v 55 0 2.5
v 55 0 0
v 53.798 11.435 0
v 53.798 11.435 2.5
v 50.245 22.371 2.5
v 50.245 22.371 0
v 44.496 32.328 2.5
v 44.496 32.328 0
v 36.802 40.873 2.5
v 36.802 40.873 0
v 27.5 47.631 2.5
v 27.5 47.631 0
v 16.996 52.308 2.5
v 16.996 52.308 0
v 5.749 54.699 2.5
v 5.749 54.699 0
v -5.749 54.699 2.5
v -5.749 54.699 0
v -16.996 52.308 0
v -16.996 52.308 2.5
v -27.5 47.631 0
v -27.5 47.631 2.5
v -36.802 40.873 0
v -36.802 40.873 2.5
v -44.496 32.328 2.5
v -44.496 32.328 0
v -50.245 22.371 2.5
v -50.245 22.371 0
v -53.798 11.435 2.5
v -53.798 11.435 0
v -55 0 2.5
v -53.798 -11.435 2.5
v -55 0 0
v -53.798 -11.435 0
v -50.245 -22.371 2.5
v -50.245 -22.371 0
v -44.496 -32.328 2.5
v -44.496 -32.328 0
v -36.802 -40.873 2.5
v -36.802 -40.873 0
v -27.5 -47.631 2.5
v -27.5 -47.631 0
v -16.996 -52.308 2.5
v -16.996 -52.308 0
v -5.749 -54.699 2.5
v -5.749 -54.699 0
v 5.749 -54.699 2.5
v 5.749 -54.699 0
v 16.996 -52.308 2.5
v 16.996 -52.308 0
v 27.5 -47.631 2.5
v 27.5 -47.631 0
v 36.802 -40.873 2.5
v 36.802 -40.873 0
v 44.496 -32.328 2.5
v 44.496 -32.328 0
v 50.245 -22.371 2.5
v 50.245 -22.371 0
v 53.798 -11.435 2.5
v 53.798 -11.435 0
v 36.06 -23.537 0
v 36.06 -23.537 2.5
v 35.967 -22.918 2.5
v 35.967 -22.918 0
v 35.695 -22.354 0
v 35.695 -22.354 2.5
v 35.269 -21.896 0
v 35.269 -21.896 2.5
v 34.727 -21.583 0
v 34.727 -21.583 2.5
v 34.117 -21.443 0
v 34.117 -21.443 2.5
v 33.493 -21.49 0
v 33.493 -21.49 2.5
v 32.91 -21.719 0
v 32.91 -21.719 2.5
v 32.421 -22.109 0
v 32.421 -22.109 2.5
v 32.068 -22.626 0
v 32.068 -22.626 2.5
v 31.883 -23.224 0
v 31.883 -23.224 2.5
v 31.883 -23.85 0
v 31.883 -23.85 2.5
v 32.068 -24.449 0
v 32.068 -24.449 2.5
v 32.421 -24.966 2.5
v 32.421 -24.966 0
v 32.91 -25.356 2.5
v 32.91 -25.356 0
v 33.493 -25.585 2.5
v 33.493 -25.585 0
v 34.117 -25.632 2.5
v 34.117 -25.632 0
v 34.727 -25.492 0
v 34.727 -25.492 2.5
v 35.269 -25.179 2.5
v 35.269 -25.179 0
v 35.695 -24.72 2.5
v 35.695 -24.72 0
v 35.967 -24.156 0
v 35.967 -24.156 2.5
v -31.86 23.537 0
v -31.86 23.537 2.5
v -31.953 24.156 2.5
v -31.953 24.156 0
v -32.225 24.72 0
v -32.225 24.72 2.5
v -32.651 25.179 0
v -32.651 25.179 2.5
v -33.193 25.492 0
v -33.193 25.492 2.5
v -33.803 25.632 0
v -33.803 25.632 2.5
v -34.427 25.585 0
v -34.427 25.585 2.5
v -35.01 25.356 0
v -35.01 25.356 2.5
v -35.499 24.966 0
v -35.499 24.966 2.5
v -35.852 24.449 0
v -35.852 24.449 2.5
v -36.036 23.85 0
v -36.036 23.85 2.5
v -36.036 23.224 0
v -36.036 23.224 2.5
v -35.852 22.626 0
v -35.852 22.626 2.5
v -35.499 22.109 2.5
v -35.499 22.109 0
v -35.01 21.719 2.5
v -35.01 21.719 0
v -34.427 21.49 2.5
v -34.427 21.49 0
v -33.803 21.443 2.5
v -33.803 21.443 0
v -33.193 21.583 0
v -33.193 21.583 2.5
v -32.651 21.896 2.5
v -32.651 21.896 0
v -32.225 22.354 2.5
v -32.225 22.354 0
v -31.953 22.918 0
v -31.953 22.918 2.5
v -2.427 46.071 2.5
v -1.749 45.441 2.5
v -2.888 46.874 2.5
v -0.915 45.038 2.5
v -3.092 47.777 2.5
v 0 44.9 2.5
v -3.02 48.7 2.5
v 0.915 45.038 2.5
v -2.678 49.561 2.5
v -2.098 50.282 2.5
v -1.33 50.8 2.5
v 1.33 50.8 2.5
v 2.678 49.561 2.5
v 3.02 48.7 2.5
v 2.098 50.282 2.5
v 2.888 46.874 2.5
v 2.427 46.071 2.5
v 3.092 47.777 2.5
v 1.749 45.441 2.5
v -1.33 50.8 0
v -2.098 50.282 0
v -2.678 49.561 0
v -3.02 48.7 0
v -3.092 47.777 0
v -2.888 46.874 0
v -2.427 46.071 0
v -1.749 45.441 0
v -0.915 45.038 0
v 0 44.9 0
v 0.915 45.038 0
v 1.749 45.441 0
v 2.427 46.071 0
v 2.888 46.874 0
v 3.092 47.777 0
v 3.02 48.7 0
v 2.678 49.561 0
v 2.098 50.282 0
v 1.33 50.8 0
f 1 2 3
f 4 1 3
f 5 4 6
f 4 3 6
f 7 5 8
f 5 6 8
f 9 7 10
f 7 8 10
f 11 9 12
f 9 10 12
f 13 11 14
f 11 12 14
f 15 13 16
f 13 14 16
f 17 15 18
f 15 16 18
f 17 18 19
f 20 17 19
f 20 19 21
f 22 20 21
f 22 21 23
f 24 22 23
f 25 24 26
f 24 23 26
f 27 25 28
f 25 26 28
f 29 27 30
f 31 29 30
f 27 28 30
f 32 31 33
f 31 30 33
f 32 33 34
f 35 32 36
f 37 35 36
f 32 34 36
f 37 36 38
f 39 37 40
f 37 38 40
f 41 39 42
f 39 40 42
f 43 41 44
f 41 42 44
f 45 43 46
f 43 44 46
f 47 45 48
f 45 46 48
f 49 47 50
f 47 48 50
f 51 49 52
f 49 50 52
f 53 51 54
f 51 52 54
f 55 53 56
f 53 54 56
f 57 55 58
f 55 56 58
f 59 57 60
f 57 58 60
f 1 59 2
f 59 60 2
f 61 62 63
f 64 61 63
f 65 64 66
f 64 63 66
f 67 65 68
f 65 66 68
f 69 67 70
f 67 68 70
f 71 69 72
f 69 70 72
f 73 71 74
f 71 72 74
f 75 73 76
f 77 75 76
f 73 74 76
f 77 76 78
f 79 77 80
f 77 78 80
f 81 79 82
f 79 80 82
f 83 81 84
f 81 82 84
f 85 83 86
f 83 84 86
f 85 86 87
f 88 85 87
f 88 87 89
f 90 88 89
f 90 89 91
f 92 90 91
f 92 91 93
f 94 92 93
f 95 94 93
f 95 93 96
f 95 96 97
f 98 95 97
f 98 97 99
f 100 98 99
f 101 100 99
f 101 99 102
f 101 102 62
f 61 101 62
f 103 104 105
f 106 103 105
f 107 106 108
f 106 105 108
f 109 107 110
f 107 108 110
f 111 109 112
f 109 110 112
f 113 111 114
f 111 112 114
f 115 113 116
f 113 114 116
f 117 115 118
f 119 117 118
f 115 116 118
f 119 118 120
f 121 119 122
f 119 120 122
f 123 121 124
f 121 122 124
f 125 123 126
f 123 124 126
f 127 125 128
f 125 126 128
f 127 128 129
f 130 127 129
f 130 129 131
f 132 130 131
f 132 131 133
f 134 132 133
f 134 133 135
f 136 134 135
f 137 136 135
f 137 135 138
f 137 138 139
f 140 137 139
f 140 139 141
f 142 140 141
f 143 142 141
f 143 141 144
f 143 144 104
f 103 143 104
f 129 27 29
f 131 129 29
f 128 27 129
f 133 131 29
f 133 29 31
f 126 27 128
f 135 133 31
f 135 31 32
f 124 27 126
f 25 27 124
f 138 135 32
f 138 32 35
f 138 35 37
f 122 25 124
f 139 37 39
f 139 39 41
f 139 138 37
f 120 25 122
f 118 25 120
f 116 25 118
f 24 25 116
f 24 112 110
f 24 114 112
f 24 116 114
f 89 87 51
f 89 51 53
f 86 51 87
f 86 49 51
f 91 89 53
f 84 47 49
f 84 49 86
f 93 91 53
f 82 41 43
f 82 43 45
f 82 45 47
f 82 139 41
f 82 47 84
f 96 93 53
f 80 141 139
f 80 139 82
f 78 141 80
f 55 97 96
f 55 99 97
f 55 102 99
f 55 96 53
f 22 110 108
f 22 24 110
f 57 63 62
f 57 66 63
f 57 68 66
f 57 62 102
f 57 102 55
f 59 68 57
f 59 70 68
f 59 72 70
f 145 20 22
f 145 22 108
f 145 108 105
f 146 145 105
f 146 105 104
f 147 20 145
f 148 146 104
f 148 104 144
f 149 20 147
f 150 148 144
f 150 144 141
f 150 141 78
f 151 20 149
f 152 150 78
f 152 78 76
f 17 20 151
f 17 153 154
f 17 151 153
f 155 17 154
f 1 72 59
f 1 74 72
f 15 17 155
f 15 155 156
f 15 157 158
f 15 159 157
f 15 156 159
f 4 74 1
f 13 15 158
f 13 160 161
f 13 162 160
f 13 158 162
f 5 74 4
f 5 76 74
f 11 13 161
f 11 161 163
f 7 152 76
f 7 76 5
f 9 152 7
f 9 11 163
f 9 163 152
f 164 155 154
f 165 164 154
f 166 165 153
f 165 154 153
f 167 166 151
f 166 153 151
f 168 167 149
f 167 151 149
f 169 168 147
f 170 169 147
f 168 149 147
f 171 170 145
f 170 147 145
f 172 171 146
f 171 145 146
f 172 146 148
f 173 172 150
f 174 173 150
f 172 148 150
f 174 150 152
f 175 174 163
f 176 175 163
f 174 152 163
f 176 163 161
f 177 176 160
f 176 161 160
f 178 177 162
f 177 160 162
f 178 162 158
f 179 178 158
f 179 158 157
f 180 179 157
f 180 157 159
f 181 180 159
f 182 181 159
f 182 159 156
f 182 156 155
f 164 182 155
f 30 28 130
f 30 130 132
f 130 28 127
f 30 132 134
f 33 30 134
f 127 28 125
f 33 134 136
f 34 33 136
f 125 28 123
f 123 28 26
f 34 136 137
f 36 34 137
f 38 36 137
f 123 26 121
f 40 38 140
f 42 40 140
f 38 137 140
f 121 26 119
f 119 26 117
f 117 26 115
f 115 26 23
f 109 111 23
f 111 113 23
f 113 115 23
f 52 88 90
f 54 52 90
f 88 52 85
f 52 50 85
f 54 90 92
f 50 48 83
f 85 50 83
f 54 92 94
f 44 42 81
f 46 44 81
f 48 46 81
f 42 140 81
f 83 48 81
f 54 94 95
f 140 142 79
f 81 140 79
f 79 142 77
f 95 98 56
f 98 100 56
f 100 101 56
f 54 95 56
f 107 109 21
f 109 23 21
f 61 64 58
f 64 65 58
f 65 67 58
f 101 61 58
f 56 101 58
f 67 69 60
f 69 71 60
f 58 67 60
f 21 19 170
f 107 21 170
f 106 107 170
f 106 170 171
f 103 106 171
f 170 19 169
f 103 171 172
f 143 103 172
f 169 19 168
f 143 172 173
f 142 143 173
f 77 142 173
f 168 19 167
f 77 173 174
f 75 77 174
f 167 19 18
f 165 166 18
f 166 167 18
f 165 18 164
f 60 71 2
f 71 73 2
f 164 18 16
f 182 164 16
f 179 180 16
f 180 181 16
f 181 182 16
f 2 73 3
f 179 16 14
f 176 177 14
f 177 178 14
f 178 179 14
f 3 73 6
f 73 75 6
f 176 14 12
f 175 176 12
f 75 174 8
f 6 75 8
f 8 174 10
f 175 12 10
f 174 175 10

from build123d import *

# Parameters (mm, degrees)
ESQUISSE1_R             = 55
BOSS_EXTRU_1_DEPTH      = 2.5
ESQUISSE2_R             = 2.1
ENL_V_MAT_EXTRU_1_DEPTH = 78.821912081
ENL_V_MAT_EXTRU_2_DEPTH = 10


with BuildPart() as part:
    # Esquisse1 → Boss.-Extru.1 (new body)
    with BuildSketch(Plane.XY):
        Circle(ESQUISSE1_R)
    extrude(amount=BOSS_EXTRU_1_DEPTH)

    # Esquisse2 → Enlèv. mat.-Extru.1 (cut, through all)
    with BuildSketch(Plane.XY.offset(2.5)):
        with Locations((33.959943273, -23.5374475)):
            Circle(ESQUISSE2_R)
        with Locations((-33.959943273, 23.5374475)):
            Circle(ESQUISSE2_R)
    extrude(amount=-ENL_V_MAT_EXTRU_1_DEPTH, mode=Mode.SUBTRACT)

    # Esquisse3 → Enlèv. mat.-Extru.2 (cut)
    with BuildSketch(Plane.XY.offset(2.5)):
        with BuildLine():
            Line((1.33041347, 50.8), (-1.33041347, 50.8))
            ThreePointArc((-1.33041347, 50.8), (0, 44.9), (1.33041347, 50.8))
        make_face()
    extrude(amount=-ENL_V_MAT_EXTRU_2_DEPTH, mode=Mode.SUBTRACT)


solid = part.part
